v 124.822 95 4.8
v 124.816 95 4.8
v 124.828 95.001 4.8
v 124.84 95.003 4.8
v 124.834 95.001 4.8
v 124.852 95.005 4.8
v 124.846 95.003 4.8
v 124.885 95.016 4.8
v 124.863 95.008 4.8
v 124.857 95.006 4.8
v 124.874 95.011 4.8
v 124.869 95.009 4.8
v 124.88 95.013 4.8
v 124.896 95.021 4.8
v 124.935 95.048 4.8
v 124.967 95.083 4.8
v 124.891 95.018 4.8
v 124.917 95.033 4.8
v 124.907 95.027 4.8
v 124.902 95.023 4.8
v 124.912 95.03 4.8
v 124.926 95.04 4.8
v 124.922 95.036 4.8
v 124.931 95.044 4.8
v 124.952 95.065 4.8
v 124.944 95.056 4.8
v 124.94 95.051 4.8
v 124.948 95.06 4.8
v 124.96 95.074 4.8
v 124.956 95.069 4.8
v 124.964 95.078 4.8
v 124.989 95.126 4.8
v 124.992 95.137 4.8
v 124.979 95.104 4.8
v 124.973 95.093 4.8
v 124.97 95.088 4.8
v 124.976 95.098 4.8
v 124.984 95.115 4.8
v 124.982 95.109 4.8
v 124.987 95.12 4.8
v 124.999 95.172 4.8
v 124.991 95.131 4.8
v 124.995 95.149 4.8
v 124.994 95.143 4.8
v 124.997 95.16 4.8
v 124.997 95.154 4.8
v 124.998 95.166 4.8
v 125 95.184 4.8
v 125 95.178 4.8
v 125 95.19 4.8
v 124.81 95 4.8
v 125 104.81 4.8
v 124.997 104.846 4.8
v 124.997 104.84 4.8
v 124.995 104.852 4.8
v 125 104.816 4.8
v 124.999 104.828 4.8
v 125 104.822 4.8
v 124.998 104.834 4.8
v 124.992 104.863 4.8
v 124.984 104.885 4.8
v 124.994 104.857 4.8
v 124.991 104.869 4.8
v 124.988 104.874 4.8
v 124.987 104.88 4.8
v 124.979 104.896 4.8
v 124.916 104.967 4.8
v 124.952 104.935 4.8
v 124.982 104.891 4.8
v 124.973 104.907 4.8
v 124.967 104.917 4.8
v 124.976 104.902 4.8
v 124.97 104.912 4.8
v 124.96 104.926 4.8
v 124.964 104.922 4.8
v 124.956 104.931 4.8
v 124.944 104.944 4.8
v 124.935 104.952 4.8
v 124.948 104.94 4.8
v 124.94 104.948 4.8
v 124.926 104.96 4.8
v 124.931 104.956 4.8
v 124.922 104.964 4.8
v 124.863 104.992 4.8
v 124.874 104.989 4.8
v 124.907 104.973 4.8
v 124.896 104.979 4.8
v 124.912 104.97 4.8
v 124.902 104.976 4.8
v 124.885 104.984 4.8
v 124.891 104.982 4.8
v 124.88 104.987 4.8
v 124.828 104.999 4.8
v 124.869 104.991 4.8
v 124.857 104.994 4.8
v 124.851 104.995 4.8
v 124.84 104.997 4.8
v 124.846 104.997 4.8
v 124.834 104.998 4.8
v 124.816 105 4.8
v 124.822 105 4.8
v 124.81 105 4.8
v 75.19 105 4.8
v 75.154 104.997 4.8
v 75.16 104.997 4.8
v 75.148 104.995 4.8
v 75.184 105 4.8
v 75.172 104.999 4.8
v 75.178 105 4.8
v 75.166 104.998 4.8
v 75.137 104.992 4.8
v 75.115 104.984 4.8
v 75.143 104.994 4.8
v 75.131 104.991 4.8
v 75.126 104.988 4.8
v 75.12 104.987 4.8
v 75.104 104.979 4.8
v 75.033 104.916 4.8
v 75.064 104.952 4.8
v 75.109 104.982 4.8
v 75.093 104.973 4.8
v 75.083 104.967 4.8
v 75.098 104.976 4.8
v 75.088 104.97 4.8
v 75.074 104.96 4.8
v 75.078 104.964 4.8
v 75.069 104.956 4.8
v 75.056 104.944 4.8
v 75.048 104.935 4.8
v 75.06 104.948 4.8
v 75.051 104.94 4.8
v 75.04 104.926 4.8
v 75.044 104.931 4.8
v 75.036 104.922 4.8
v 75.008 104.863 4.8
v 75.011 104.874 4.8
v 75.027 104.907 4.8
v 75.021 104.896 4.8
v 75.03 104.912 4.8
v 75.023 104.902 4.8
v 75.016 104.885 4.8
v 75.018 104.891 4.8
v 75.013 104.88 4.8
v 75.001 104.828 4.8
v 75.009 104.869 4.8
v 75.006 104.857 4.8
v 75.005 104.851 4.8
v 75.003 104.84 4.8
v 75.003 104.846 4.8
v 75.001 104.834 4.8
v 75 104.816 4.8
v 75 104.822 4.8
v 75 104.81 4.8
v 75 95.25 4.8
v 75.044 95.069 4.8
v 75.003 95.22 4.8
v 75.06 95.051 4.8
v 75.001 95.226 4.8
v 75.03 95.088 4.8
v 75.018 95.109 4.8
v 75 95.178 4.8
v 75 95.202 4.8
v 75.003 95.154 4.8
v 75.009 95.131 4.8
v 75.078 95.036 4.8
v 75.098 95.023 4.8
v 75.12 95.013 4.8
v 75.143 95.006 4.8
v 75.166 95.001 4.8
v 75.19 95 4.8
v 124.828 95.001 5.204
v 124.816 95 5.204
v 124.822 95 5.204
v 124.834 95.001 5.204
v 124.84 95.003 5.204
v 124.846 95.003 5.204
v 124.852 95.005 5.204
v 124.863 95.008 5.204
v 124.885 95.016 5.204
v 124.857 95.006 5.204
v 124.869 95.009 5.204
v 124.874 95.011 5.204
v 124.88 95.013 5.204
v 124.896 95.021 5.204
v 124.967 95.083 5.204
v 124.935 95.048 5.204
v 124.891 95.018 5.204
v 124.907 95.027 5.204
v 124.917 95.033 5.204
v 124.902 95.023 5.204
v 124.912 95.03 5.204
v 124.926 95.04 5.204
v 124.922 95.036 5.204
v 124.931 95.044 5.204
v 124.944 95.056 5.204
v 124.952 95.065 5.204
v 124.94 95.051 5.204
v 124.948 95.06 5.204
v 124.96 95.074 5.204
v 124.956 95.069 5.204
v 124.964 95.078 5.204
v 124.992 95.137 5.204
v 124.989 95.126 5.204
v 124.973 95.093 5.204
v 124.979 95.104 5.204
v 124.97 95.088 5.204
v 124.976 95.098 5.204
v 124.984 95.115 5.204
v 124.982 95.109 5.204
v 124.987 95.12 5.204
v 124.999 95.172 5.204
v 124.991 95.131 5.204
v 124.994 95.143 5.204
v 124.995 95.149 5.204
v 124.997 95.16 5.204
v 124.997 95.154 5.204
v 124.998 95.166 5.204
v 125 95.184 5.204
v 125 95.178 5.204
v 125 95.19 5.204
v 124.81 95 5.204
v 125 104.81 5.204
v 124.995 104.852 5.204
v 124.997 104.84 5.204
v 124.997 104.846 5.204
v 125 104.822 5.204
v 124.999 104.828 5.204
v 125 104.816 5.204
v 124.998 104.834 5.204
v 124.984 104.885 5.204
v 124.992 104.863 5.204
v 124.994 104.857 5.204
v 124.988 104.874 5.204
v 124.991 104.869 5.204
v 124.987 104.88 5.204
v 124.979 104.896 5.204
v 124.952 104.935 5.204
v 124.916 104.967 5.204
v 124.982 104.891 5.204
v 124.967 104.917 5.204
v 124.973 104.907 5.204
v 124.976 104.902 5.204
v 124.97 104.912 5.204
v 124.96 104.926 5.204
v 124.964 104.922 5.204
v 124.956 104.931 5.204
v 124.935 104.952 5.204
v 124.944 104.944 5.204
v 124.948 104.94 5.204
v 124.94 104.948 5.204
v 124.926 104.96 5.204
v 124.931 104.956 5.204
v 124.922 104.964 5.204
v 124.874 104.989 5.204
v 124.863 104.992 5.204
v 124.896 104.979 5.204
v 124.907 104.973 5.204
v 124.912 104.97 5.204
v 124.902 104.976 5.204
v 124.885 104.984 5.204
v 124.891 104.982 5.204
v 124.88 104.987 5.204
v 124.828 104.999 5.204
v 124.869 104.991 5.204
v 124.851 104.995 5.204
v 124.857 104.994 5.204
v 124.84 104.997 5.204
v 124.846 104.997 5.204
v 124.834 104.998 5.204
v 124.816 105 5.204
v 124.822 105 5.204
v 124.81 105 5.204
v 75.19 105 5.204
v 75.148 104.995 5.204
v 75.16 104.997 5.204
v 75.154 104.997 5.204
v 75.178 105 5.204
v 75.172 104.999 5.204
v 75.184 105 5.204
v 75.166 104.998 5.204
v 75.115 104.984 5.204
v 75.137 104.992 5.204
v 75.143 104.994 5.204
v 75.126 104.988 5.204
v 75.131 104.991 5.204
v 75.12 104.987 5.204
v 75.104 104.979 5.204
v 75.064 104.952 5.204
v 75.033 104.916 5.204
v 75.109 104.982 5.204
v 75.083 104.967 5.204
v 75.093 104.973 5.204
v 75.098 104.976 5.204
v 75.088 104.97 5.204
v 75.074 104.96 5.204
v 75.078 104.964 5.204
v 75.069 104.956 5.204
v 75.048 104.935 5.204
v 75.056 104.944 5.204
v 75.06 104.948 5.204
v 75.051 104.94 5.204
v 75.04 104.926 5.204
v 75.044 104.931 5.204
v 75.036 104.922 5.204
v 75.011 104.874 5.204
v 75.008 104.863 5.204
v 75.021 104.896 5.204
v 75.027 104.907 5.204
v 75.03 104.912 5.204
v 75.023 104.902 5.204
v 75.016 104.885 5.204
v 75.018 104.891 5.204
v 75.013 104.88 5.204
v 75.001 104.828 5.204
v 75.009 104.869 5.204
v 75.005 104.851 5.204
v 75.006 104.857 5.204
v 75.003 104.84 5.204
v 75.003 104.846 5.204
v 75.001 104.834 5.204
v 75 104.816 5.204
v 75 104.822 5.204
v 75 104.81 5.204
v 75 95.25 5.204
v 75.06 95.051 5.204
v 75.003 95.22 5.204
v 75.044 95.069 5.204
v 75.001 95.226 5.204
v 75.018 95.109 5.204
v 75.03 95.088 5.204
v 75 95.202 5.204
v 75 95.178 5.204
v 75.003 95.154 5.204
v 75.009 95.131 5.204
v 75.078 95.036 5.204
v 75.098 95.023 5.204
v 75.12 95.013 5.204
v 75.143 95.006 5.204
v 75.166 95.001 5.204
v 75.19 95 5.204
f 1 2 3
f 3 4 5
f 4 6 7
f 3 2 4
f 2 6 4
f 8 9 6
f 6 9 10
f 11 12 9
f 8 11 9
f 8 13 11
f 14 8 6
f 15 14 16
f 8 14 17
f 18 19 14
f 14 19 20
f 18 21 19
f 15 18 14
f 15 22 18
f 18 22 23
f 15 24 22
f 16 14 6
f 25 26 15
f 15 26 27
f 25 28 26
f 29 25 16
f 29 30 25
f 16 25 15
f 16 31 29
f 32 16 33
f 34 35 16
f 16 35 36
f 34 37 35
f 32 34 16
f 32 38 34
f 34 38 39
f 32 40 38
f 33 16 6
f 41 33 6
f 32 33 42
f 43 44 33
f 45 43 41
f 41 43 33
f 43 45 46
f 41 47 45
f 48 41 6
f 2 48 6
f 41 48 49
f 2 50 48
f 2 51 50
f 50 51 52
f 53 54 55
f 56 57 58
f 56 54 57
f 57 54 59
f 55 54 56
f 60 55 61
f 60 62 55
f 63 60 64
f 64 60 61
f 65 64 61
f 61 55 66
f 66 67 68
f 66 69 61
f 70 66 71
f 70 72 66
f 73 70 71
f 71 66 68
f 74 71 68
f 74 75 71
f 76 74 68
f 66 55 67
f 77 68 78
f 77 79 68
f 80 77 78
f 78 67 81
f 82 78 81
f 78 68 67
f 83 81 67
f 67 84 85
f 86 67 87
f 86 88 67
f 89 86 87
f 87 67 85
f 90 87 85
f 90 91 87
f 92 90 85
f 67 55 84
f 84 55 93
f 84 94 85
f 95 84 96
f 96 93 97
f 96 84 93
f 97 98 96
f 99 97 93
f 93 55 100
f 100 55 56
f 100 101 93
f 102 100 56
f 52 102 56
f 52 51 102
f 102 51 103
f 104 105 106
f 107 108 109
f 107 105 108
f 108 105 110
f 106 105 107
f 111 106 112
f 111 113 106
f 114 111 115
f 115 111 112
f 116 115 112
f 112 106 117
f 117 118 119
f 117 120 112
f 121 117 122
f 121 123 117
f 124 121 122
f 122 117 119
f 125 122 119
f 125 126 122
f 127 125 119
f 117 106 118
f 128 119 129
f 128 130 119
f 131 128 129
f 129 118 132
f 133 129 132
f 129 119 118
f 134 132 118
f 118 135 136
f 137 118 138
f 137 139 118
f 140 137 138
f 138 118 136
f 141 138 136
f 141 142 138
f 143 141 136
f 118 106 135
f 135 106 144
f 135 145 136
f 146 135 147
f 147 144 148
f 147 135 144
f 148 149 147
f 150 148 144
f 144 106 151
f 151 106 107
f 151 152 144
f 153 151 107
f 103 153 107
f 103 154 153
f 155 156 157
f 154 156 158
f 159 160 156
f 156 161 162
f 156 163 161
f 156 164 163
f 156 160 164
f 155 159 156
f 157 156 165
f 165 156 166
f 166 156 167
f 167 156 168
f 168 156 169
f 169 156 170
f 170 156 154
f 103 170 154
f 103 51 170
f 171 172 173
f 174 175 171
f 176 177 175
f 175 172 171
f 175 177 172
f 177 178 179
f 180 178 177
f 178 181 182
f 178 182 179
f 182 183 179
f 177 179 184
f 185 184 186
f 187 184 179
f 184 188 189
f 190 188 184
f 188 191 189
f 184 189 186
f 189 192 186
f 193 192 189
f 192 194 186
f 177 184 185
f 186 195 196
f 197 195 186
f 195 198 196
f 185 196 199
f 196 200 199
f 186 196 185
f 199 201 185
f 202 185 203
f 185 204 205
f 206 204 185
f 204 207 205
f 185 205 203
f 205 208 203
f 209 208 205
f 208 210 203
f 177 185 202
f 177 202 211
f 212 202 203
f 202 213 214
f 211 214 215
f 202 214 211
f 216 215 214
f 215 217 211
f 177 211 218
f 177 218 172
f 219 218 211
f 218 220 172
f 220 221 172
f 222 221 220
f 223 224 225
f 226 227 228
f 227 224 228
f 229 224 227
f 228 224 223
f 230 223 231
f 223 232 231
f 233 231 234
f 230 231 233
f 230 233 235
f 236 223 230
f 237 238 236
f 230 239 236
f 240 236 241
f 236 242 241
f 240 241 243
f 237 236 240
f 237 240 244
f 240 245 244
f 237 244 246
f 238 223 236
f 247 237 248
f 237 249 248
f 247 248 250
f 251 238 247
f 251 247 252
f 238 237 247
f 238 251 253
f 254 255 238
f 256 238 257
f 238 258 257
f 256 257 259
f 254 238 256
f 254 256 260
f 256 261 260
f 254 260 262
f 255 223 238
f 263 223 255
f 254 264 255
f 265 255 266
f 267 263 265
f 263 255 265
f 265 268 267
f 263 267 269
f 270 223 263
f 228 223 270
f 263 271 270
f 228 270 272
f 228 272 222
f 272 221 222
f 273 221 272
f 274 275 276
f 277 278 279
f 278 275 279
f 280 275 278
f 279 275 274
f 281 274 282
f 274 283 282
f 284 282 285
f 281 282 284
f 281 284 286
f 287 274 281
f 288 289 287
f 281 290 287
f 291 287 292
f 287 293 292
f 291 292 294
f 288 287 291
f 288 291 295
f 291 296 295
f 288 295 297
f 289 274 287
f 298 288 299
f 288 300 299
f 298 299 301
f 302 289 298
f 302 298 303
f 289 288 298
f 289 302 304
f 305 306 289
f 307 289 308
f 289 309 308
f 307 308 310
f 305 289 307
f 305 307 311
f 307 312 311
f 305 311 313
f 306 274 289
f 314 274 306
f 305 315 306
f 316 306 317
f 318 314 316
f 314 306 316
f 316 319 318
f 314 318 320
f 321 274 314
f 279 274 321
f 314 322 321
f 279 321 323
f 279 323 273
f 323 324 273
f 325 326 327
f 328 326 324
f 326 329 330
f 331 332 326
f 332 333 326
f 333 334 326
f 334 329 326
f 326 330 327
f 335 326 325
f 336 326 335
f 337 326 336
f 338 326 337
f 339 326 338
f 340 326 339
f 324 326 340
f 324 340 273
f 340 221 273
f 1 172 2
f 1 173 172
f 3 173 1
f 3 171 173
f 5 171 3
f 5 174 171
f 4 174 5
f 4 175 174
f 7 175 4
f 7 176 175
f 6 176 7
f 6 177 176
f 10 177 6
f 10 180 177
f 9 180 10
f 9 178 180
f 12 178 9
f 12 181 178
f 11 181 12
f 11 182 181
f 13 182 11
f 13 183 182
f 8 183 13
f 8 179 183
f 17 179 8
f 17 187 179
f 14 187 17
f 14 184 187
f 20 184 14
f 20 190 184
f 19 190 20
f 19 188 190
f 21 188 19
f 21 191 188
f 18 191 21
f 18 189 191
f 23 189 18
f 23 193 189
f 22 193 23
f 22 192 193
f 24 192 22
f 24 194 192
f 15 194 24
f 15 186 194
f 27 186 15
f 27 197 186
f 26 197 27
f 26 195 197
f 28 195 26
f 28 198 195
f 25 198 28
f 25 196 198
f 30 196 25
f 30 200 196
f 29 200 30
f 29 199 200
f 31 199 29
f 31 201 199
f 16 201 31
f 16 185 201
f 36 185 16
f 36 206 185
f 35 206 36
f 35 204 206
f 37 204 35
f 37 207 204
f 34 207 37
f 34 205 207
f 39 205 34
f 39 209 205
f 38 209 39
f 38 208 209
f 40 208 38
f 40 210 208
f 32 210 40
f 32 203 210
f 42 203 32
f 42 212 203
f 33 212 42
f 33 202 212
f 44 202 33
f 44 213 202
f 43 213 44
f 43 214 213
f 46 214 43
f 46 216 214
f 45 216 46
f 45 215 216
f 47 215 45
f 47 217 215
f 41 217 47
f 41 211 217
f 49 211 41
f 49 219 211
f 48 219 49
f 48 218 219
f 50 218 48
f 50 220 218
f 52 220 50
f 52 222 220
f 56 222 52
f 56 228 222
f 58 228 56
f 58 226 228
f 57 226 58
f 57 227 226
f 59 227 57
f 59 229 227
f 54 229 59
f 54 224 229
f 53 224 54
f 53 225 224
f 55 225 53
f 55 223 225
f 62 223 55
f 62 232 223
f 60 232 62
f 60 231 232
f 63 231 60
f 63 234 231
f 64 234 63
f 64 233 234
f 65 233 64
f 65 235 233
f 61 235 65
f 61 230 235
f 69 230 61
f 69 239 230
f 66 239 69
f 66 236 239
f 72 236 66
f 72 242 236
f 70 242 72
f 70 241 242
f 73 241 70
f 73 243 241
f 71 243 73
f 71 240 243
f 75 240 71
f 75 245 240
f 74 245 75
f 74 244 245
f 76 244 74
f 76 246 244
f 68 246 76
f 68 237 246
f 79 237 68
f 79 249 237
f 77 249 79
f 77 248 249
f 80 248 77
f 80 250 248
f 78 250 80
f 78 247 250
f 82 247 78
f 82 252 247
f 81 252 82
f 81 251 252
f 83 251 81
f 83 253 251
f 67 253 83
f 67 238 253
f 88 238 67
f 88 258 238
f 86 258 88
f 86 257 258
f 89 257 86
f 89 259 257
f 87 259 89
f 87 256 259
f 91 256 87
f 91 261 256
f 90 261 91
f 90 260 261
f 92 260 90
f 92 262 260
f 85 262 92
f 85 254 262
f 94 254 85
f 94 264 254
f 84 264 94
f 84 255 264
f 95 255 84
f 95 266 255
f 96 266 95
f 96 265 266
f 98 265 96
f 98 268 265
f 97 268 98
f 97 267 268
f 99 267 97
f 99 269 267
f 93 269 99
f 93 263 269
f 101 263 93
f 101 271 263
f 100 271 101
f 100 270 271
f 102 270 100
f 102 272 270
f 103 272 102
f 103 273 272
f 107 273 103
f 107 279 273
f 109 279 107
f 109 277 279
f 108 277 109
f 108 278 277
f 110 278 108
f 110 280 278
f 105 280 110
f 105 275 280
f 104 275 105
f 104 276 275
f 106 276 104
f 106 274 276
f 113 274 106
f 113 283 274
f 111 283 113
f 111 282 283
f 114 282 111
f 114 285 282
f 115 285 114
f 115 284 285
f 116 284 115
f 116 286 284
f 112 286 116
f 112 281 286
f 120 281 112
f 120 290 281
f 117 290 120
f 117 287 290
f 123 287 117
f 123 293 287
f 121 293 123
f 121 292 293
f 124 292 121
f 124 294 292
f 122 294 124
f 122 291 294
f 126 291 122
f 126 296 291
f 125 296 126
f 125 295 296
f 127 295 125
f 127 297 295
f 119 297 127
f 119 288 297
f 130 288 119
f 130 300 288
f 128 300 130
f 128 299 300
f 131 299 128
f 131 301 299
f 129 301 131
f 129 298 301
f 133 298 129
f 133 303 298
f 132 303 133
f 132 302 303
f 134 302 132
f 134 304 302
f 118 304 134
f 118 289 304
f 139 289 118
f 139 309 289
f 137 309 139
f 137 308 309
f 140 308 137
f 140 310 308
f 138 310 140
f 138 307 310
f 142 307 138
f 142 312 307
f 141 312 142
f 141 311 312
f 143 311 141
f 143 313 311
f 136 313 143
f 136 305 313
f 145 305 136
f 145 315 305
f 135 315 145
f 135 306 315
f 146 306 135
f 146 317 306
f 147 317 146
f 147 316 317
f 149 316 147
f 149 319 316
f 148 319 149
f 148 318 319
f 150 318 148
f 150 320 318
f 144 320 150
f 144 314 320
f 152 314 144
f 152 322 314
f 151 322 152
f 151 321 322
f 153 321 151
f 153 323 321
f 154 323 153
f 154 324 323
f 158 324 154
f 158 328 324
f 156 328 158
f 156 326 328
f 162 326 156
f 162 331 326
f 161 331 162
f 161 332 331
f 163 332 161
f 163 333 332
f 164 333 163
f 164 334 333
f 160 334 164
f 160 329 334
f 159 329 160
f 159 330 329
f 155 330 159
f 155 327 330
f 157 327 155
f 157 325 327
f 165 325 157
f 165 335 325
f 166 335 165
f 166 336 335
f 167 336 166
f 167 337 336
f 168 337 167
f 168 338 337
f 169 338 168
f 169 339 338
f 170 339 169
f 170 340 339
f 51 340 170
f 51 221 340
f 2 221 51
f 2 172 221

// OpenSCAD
module drawBasicShape(x1, y1, x2, y2, width)
{
	length = sqrt((x1-x2)*(x1-x2) + (y1-y2)*(y1-y2));
	if (width!=0.0) {
		square(size = [width, length], center = false);
		translate([width/2.0, 0, 0]) circle(d=width);
		translate([width/2.0, length, 0]) circle(d=width);
	}
}

module translateAndRotate(x1, y1, x2, y2, width)
{
	if (width != 0.0) {
		angle = atan((y2-y1)/(x2-x1)) +270;
		if (x2>=x1) {
			translate([x1, y1, 0.0]) rotate([0.0, 0.0, angle]) translate([-width/2.0, 0.0, 0.0]) scale([1.0, 1.0, 1.0]) drawBasicShape(x1, y1, x2, y2, width);
		}
		else {
			translate([x1, y1, 0.0]) rotate([0.0, 0.0, angle+180]) translate([-width/2.0, 0.0, 0.0]) scale([1.0, 1.0, 1.0]) drawBasicShape(x1, y1, x2, y2, width);		}
	}
}

$fn=50;

points11 = [
[75.77800000, 95.77800000, 0.00000000],
[124.22200000, 95.77800000, 0.37999548],
[124.22200000, 104.22200000, 0.37997788],
[75.77800000, 104.22200000, 0.37999672],
[75.77800000, 95.83800000, 0.37997423],
[75.48400000, 95.48400000, 0.00000000],
[124.51600000, 95.48400000, 0.37999868],
[124.51600000, 104.51600000, 0.37998977],
[75.48400000, 104.51600000, 0.37999746],
[75.48400000, 95.54400000, 0.37999314],
[75.19000000, 95.19000000, 0.00000000],
[124.81000000, 95.19000000, 0.37999939],
[124.81000000, 104.81000000, 0.38000021],
[75.19000000, 104.81000000, 0.38000060],
[75.19000000, 95.25000000, 0.37999715],
[75.53600000, 95.39000000, 0.00000000],
[76.11100000, 95.94600000, 0.00000000],
[75.94600000, 96.11100000, 0.37961375],
[75.94600000, 96.52800000, 0.38001190],
[76.52800000, 95.94600000, 0.37989934],
[76.94500000, 95.94600000, 0.38001190],
[75.94600000, 96.94500000, 0.37998907],
[75.94600000, 97.36200000, 0.38001190],
[77.36200000, 95.94600000, 0.37999592],
[77.77900000, 95.94600000, 0.38001190],
[75.94600000, 97.77900000, 0.37999966],
[75.94600000, 98.19600000, 0.38001190],
[78.19600000, 95.94600000, 0.38002091],
[78.61300000, 95.94600000, 0.38001190],
[75.94600000, 98.61300000, 0.38001957],
[75.94600000, 99.03000000, 0.38001190],
[79.03000000, 95.94600000, 0.38001859],
[79.44700000, 95.94600000, 0.38001190],
[75.94600000, 99.44700000, 0.38002999],
[75.94600000, 99.86400000, 0.38001190],
[79.86400000, 95.94600000, 0.38002811],
[80.28100000, 95.94600000, 0.38001190],
[75.94600000, 100.28100000, 0.38002660],
[75.94600000, 100.69800000, 0.38001190],
[80.69800000, 95.94600000, 0.38002534],
[81.11500000, 95.94600000, 0.38015610],
[75.94600000, 101.11500000, 0.38002430],
[75.94600000, 101.53300000, 0.37945200],
[81.53300000, 95.94600000, 0.37997836],
[81.95000000, 95.94600000, 0.38001190],
[75.94600000, 101.95000000, 0.37998072],
[75.94600000, 102.36700000, 0.38001190],
[82.36700000, 95.94600000, 0.37998939],
[82.78400000, 95.94600000, 0.38001190],
[75.94600000, 102.78400000, 0.37999079],
[75.94600000, 103.20100000, 0.38015610],
[83.20100000, 95.94600000, 0.37999203],
[83.61800000, 95.94600000, 0.38001190],
[75.94600000, 103.61800000, 0.37999868],
[75.95600000, 104.02400000, 0.38048727],
[84.03500000, 95.94600000, 0.37999749],
[84.45200000, 95.94600000, 0.38015610],
[76.34400000, 104.05400000, 0.38000229],
[76.76100000, 104.05400000, 0.38001190],
[84.86900000, 95.94600000, 0.38000754],
[85.28600000, 95.94600000, 0.38001190],
[77.17800000, 104.05400000, 0.38000229],
[77.59500000, 104.05400000, 0.38001190],
[85.70300000, 95.94600000, 0.38000754],
[86.12000000, 95.94600000, 0.38001190],
[78.01200000, 104.05400000, 0.38000229],
[78.42900000, 104.05400000, 0.38015610],
[86.53700000, 95.94600000, 0.38000229],
[86.95400000, 95.94600000, 0.38001190],
[78.84600000, 104.05400000, 0.38000754],
[79.26300000, 104.05400000, 0.38001190],
[87.37100000, 95.94600000, 0.38000229],
[87.78900000, 95.94600000, 0.37930814],
[79.68000000, 104.05400000, 0.37998940],
[80.09700000, 104.05400000, 0.38001190],
[88.20600000, 95.94600000, 0.37998415],
[88.62300000, 95.94600000, 0.38015610],
[80.51500000, 104.05400000, 0.38000229],
[80.93200000, 104.05400000, 0.38001190],
[89.04000000, 95.94600000, 0.38000754],
[89.45700000, 95.94600000, 0.38001190],
[81.34900000, 104.05400000, 0.38000229],
[81.76600000, 104.05400000, 0.38001190],
[89.87400000, 95.94600000, 0.38000754],
[90.29100000, 95.94600000, 0.38001190],
[82.18300000, 104.05400000, 0.38000229],
[82.60000000, 104.05400000, 0.38015610],
[90.70800000, 95.94600000, 0.38000229],
[91.12500000, 95.94600000, 0.38001190],
[83.01700000, 104.05400000, 0.38000754],
[83.43400000, 104.05400000, 0.38001190],
[91.54200000, 95.94600000, 0.38000229],
[91.95900000, 95.94600000, 0.38001190],
[83.85100000, 104.05400000, 0.38000754],
[84.26800000, 104.05400000, 0.38001190],
[92.37600000, 95.94600000, 0.38000229],
[92.79300000, 95.94600000, 0.38015610],
[84.68500000, 104.05400000, 0.38000229],
[85.10200000, 104.05400000, 0.38001190],
[93.21000000, 95.94600000, 0.38000229],
[93.62700000, 95.94600000, 0.38015610],
[85.51900000, 104.05400000, 0.38000229],
[85.93600000, 104.05400000, 0.38001190],
[94.04400000, 95.94600000, 0.38000754],
[94.46200000, 95.94600000, 0.37930814],
[86.35300000, 104.05400000, 0.37998415],
[86.77000000, 104.05400000, 0.38015610],
[94.87900000, 95.94600000, 0.37998415],
[95.29600000, 95.94600000, 0.38001190],
[87.18800000, 104.05400000, 0.38000229],
[87.60500000, 104.05400000, 0.38015610],
[95.71300000, 95.94600000, 0.38000229],
[96.13000000, 95.94600000, 0.38001190],
[88.02200000, 104.05400000, 0.38000754],
[88.43900000, 104.05400000, 0.38001190],
[96.54700000, 95.94600000, 0.38000229],
[96.96400000, 95.94600000, 0.38001190],
[88.85600000, 104.05400000, 0.38000754],
[89.27300000, 104.05400000, 0.38001190],
[97.38100000, 95.94600000, 0.38000229],
[97.79800000, 95.94600000, 0.38015610],
[89.69000000, 104.05400000, 0.38000229],
[90.10700000, 104.05400000, 0.38001190],
[98.21500000, 95.94600000, 0.38000754],
[98.63200000, 95.94600000, 0.38001190],
[90.52400000, 104.05400000, 0.38000229],
[90.94100000, 104.05400000, 0.38001190],
[99.04900000, 95.94600000, 0.38000754],
[99.46600000, 95.94600000, 0.38001190],
[91.35800000, 104.05400000, 0.38000229],
[91.77500000, 104.05400000, 0.38015610],
[99.88300000, 95.94600000, 0.38000229],
[100.30000000, 95.94600000, 0.38001190],
[92.19200000, 104.05400000, 0.38000754],
[92.60900000, 104.05400000, 0.38001190],
[100.71800000, 95.94600000, 0.37998415],
[101.13500000, 95.94600000, 0.38001190],
[93.02600000, 104.05400000, 0.37998940],
[93.44400000, 104.05400000, 0.37930814],
[101.55200000, 95.94600000, 0.38000229],
[101.96900000, 95.94600000, 0.38015610],
[93.86100000, 104.05400000, 0.38000229],
[94.27800000, 104.05400000, 0.38001190],
[102.38600000, 95.94600000, 0.38000754],
[102.80300000, 95.94600000, 0.38001190],
[94.69500000, 104.05400000, 0.38000229],
[95.11200000, 104.05400000, 0.38001190],
[103.22000000, 95.94600000, 0.38000754],
[103.63700000, 95.94600000, 0.38001190],
[95.52900000, 104.05400000, 0.38000229],
[95.94600000, 104.05400000, 0.38015610],
[104.05400000, 95.94600000, 0.38000229],
[104.47100000, 95.94600000, 0.38001190],
[96.36300000, 104.05400000, 0.38000754],
[96.78000000, 104.05400000, 0.38001190],
[104.88800000, 95.94600000, 0.38000229],
[105.30500000, 95.94600000, 0.38001190],
[97.19700000, 104.05400000, 0.38000754],
[97.61400000, 104.05400000, 0.38001190],
[105.72200000, 95.94600000, 0.38000229],
[106.13900000, 95.94600000, 0.38015610],
[98.03100000, 104.05400000, 0.38000229],
[98.44800000, 104.05400000, 0.38001190],
[106.55600000, 95.94600000, 0.38000754],
[106.97300000, 95.94600000, 0.38001190],
[98.86500000, 104.05400000, 0.38000229],
[99.28200000, 104.05400000, 0.38001190],
[107.39100000, 95.94600000, 0.37998940],
[107.80800000, 95.94600000, 0.38001190],
[99.69900000, 104.05400000, 0.37998415],
[100.11700000, 104.05400000, 0.37945200],
[108.22500000, 95.94600000, 0.38000229],
[108.64200000, 95.94600000, 0.38001190],
[100.53400000, 104.05400000, 0.38000754],
[100.95100000, 104.05400000, 0.38001190],
[109.05900000, 95.94600000, 0.38000229],
[109.47600000, 95.94600000, 0.38001190],
[101.36800000, 104.05400000, 0.38000754],
[101.78500000, 104.05400000, 0.38001190],
[109.89300000, 95.94600000, 0.38000229],
[110.31000000, 95.94600000, 0.38015610],
[102.20200000, 104.05400000, 0.38000229],
[102.61900000, 104.05400000, 0.38001190],
[110.72700000, 95.94600000, 0.38000754],
[111.14400000, 95.94600000, 0.38001190],
[103.03600000, 104.05400000, 0.38000229],
[103.45300000, 104.05400000, 0.38001190],
[111.56100000, 95.94600000, 0.38000754],
[111.97800000, 95.94600000, 0.38001190],
[103.87000000, 104.05400000, 0.38000229],
[104.28700000, 104.05400000, 0.38015610],
[112.39500000, 95.94600000, 0.38000229],
[112.81200000, 95.94600000, 0.38001190],
[104.70400000, 104.05400000, 0.38000754],
[105.12100000, 104.05400000, 0.38001190],
[113.22900000, 95.94600000, 0.38000229],
[113.64700000, 95.94600000, 0.37930814],
[105.53800000, 104.05400000, 0.37998940],
[105.95500000, 104.05400000, 0.38001190],
[114.06400000, 95.94600000, 0.37998415],
[114.48100000, 95.94600000, 0.38015610],
[106.37300000, 104.05400000, 0.38000229],
[106.79000000, 104.05400000, 0.38001190],
[114.89800000, 95.94600000, 0.38000754],
[115.31500000, 95.94600000, 0.38001190],
[107.20700000, 104.05400000, 0.38000229],
[107.62400000, 104.05400000, 0.38001190],
[115.73200000, 95.94600000, 0.38000754],
[116.14900000, 95.94600000, 0.38001190],
[108.04100000, 104.05400000, 0.38000229],
[108.45800000, 104.05400000, 0.38015610],
[116.56600000, 95.94600000, 0.38000229],
[116.98300000, 95.94600000, 0.38001190],
[108.87500000, 104.05400000, 0.38000754],
[109.29200000, 104.05400000, 0.38001190],
[117.40000000, 95.94600000, 0.38000229],
[117.81700000, 95.94600000, 0.38001190],
[109.70900000, 104.05400000, 0.38000754],
[110.12600000, 104.05400000, 0.38001190],
[118.23400000, 95.94600000, 0.38000229],
[118.65100000, 95.94600000, 0.38015610],
[110.54300000, 104.05400000, 0.38000229],
[110.96000000, 104.05400000, 0.38001190],
[119.06800000, 95.94600000, 0.38000754],
[119.48500000, 95.94600000, 0.38001190],
[111.37700000, 104.05400000, 0.38000229],
[111.79400000, 104.05400000, 0.38001190],
[119.90200000, 95.94600000, 0.38000754],
[120.32000000, 95.94600000, 0.37930814],
[112.21100000, 104.05400000, 0.37998415],
[112.62900000, 104.05400000, 0.37945200],
[120.73700000, 95.94600000, 0.38000229],
[121.15400000, 95.94600000, 0.38001190],
[113.04600000, 104.05400000, 0.38000754],
[113.46300000, 104.05400000, 0.38001190],
[121.57100000, 95.94600000, 0.38000229],
[121.98800000, 95.94600000, 0.38001190],
[113.88000000, 104.05400000, 0.38000754],
[114.29700000, 104.05400000, 0.38001190],
[122.40500000, 95.94600000, 0.38000229],
[122.82200000, 95.94600000, 0.38015610],
[114.71400000, 104.05400000, 0.38000229],
[115.13100000, 104.05400000, 0.38001190],
[123.23900000, 95.94600000, 0.38000754],
[123.65600000, 95.94600000, 0.38001190],
[115.54800000, 104.05400000, 0.38000229],
[115.96500000, 104.05400000, 0.38001190],
[124.04400000, 95.97500000, 0.37998455],
[124.05400000, 96.38200000, 0.37976376],
[116.38200000, 104.05400000, 0.37999868],
[116.79900000, 104.05400000, 0.38001190],
[124.05400000, 96.79900000, 0.37999789],
[124.05400000, 97.21600000, 0.38001190],
[117.21600000, 104.05400000, 0.37999701],
[117.63300000, 104.05400000, 0.38001190],
[124.05400000, 97.63300000, 0.37998939],
[124.05400000, 98.05000000, 0.38001190],
[118.05000000, 104.05400000, 0.37998780],
[118.46700000, 104.05400000, 0.38001190],
[124.05400000, 98.46700000, 0.37997836],
[124.05400000, 98.88400000, 0.38015610],
[118.88400000, 104.05400000, 0.37997562],
[119.30200000, 104.05400000, 0.37930814],
[124.05400000, 99.30200000, 0.38003429],
[124.05400000, 99.71900000, 0.38001190],
[119.71900000, 104.05400000, 0.38002660],
[120.13600000, 104.05400000, 0.38015610],
[124.05400000, 100.13600000, 0.38002811],
[124.05400000, 100.55300000, 0.38001190],
[120.55300000, 104.05400000, 0.38002999],
[120.97000000, 104.05400000, 0.38001190],
[124.05400000, 100.97000000, 0.38001859],
[124.05400000, 101.38700000, 0.38001190],
[121.38700000, 104.05400000, 0.38003551],
[121.80400000, 104.05400000, 0.38001190],
[124.05400000, 101.80400000, 0.38002091],
[124.05400000, 102.22100000, 0.38001190],
[122.22100000, 104.05400000, 0.37999966],
[122.63800000, 104.05400000, 0.38001190],
[124.05400000, 102.63800000, 0.38002595],
[124.05400000, 103.05500000, 0.38001190],
[123.05500000, 104.05400000, 0.37998907],
[123.47200000, 104.05400000, 0.38001190],
[124.05400000, 103.47200000, 0.37989934],
[124.05400000, 103.88900000, 0.38001190],
[123.88900000, 104.05400000, 0.37987144],
];

translate([0.0, 0.0, 4.80000000]) {
	linear_extrude(height = 0.40400000, center = false, convexity = 10, twist = 0) {
		union() {
			for( i=[0:len(points11)-2] ){ 
				x1 = points11[i][0];
				y1 = points11[i][1];
				x2 = points11[i+1][0];
				y2 = points11[i+1][1];
				width = points11[i+1][2];
				translateAndRotate(x1, y1, x2, y2, width);
			}
		}
	}
}
